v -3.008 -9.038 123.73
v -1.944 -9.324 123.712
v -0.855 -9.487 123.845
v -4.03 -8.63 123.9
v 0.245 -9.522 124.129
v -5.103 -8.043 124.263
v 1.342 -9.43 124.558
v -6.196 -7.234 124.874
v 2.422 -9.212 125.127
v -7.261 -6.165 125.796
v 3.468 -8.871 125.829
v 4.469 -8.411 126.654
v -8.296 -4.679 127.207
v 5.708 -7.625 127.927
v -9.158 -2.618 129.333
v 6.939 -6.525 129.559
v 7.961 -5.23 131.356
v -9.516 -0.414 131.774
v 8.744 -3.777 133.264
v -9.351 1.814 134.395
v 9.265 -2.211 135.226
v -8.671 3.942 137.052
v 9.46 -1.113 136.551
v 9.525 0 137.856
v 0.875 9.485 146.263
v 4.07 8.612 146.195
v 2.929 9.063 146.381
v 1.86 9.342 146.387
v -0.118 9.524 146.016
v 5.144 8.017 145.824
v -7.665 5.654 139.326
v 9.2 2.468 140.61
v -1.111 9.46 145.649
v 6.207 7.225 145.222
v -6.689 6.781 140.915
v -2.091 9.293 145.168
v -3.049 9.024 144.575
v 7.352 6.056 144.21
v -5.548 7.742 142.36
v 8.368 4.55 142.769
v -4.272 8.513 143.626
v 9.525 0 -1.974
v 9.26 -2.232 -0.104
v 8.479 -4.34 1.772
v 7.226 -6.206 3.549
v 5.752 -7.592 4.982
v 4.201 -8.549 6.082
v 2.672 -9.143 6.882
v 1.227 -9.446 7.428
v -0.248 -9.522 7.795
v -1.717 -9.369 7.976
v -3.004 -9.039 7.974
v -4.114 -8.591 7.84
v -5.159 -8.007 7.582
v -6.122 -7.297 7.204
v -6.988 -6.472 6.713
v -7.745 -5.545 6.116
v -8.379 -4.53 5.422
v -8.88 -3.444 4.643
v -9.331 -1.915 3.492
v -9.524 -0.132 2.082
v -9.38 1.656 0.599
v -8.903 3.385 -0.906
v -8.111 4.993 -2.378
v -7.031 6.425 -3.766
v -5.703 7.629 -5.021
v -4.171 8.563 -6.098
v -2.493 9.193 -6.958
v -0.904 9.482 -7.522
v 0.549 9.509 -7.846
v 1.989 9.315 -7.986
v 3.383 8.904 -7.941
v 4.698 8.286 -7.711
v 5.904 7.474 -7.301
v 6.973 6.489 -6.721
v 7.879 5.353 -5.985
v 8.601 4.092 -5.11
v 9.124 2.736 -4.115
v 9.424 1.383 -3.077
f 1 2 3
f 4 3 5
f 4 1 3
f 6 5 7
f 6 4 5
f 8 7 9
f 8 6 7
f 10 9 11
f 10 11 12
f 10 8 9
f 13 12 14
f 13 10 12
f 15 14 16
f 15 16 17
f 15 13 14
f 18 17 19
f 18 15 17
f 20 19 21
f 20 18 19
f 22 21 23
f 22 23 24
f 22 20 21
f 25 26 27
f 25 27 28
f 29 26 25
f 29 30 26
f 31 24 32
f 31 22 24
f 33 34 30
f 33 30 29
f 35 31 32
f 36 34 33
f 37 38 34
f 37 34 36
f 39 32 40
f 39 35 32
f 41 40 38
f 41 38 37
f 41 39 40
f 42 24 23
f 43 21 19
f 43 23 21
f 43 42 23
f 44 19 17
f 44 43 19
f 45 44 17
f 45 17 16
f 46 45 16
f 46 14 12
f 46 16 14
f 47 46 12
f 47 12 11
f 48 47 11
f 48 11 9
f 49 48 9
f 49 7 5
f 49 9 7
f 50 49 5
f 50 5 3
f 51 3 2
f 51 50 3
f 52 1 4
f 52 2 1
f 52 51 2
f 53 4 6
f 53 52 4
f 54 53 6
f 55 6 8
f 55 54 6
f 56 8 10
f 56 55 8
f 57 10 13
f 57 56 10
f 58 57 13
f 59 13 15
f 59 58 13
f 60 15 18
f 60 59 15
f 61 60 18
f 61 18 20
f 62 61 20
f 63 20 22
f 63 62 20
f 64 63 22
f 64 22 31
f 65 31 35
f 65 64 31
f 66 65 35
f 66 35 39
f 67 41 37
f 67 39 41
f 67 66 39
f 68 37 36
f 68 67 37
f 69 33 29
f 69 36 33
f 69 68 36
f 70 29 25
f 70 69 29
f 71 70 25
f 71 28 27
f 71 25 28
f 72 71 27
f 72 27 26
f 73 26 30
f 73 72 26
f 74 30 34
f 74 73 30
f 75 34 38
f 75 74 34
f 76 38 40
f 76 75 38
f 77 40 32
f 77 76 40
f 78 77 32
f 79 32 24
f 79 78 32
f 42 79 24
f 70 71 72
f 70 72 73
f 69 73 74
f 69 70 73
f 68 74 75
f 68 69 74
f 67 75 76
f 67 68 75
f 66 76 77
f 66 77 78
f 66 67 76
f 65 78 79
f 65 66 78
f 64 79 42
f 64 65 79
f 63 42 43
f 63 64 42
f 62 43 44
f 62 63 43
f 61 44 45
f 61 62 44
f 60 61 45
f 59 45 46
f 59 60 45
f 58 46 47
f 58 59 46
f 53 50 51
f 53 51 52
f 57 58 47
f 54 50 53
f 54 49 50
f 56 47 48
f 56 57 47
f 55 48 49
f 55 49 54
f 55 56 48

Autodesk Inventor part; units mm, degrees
ref_plane "Start Plane" through (0, 0, -9.7188) normal (0, 0, 1) x (1, 0, 0)
ref_plane "End Plane" through (0, 0, 148.8552) normal (0, 0, 1) x (1, 0, 0)
sketch "Sketch" plane through (0, 0, 0) normal (0, 0, 1) x (1, 0, 0)
  circle A0 centre (0, 0) radius 9.525
  dimension "d0" = 19.05
extrude "Body" add sketch "Sketch" along normal up to surface (158.574 mm away) from surface at -9.7188
sketch "Sketch2" plane through (0, 0, 0) normal (0, 0, 1) x (1, 0, 0)
  line L0 (0, 0) -> (10, 0)
ref_plane "Work Plane3" through (0, 0, 0) normal (0, -1, 0) x (1, 0, 0)
ref_plane "Work Plane4" through (2.3525, 9.2299, -7.9924) normal (-0.1588, -0.6229, -0.766) x (0.8923, -0.4227, 0.1588)
split "Split1" plane through (2.3525, 9.2299, -7.9924) removes the side toward (-0.1588, -0.6229, -0.766)
ref_plane "Work Plane5" through (2.3525, 9.2299, 146.4032) normal (-0.1892, -0.7423, 0.6428) x (0.9782, -0.0855, 0.1892)
split "Split2" plane through (2.3525, 9.2299, 146.4032) removes the side toward (-0.1892, -0.7423, 0.6428)
sketch "Sketch3" plane through (0, 0, 0) normal (0, -1, 0) x (1, 0, 0)
  line L0 (-2, -9.7188) -> (12, -9.7188) projected
  line L1 (-2, 148.8552) -> (12, 148.8552) projected
  dimension "d7" = 158.574
equation "\"d0\" = Diam"
equation "\"d1\" = G_L"
equation "\"Diam\" = 19.05"
equation "\"G_L\" = 154.39562"
equation "\"G_OFFSET_START\" = 9.71882"
equation "\"G_OFFSET_END\" = 13.80341"
equation "\"d4\" = -G_OFFSET_START"
equation "\"d5\" = G_OFFSET_END + B_L"
equation "\"B_L\" = 135.05174"
properties part number "ANSI/AISC Rolled Steel - 3/4-6.079, RB" material "Steel, Mild"
